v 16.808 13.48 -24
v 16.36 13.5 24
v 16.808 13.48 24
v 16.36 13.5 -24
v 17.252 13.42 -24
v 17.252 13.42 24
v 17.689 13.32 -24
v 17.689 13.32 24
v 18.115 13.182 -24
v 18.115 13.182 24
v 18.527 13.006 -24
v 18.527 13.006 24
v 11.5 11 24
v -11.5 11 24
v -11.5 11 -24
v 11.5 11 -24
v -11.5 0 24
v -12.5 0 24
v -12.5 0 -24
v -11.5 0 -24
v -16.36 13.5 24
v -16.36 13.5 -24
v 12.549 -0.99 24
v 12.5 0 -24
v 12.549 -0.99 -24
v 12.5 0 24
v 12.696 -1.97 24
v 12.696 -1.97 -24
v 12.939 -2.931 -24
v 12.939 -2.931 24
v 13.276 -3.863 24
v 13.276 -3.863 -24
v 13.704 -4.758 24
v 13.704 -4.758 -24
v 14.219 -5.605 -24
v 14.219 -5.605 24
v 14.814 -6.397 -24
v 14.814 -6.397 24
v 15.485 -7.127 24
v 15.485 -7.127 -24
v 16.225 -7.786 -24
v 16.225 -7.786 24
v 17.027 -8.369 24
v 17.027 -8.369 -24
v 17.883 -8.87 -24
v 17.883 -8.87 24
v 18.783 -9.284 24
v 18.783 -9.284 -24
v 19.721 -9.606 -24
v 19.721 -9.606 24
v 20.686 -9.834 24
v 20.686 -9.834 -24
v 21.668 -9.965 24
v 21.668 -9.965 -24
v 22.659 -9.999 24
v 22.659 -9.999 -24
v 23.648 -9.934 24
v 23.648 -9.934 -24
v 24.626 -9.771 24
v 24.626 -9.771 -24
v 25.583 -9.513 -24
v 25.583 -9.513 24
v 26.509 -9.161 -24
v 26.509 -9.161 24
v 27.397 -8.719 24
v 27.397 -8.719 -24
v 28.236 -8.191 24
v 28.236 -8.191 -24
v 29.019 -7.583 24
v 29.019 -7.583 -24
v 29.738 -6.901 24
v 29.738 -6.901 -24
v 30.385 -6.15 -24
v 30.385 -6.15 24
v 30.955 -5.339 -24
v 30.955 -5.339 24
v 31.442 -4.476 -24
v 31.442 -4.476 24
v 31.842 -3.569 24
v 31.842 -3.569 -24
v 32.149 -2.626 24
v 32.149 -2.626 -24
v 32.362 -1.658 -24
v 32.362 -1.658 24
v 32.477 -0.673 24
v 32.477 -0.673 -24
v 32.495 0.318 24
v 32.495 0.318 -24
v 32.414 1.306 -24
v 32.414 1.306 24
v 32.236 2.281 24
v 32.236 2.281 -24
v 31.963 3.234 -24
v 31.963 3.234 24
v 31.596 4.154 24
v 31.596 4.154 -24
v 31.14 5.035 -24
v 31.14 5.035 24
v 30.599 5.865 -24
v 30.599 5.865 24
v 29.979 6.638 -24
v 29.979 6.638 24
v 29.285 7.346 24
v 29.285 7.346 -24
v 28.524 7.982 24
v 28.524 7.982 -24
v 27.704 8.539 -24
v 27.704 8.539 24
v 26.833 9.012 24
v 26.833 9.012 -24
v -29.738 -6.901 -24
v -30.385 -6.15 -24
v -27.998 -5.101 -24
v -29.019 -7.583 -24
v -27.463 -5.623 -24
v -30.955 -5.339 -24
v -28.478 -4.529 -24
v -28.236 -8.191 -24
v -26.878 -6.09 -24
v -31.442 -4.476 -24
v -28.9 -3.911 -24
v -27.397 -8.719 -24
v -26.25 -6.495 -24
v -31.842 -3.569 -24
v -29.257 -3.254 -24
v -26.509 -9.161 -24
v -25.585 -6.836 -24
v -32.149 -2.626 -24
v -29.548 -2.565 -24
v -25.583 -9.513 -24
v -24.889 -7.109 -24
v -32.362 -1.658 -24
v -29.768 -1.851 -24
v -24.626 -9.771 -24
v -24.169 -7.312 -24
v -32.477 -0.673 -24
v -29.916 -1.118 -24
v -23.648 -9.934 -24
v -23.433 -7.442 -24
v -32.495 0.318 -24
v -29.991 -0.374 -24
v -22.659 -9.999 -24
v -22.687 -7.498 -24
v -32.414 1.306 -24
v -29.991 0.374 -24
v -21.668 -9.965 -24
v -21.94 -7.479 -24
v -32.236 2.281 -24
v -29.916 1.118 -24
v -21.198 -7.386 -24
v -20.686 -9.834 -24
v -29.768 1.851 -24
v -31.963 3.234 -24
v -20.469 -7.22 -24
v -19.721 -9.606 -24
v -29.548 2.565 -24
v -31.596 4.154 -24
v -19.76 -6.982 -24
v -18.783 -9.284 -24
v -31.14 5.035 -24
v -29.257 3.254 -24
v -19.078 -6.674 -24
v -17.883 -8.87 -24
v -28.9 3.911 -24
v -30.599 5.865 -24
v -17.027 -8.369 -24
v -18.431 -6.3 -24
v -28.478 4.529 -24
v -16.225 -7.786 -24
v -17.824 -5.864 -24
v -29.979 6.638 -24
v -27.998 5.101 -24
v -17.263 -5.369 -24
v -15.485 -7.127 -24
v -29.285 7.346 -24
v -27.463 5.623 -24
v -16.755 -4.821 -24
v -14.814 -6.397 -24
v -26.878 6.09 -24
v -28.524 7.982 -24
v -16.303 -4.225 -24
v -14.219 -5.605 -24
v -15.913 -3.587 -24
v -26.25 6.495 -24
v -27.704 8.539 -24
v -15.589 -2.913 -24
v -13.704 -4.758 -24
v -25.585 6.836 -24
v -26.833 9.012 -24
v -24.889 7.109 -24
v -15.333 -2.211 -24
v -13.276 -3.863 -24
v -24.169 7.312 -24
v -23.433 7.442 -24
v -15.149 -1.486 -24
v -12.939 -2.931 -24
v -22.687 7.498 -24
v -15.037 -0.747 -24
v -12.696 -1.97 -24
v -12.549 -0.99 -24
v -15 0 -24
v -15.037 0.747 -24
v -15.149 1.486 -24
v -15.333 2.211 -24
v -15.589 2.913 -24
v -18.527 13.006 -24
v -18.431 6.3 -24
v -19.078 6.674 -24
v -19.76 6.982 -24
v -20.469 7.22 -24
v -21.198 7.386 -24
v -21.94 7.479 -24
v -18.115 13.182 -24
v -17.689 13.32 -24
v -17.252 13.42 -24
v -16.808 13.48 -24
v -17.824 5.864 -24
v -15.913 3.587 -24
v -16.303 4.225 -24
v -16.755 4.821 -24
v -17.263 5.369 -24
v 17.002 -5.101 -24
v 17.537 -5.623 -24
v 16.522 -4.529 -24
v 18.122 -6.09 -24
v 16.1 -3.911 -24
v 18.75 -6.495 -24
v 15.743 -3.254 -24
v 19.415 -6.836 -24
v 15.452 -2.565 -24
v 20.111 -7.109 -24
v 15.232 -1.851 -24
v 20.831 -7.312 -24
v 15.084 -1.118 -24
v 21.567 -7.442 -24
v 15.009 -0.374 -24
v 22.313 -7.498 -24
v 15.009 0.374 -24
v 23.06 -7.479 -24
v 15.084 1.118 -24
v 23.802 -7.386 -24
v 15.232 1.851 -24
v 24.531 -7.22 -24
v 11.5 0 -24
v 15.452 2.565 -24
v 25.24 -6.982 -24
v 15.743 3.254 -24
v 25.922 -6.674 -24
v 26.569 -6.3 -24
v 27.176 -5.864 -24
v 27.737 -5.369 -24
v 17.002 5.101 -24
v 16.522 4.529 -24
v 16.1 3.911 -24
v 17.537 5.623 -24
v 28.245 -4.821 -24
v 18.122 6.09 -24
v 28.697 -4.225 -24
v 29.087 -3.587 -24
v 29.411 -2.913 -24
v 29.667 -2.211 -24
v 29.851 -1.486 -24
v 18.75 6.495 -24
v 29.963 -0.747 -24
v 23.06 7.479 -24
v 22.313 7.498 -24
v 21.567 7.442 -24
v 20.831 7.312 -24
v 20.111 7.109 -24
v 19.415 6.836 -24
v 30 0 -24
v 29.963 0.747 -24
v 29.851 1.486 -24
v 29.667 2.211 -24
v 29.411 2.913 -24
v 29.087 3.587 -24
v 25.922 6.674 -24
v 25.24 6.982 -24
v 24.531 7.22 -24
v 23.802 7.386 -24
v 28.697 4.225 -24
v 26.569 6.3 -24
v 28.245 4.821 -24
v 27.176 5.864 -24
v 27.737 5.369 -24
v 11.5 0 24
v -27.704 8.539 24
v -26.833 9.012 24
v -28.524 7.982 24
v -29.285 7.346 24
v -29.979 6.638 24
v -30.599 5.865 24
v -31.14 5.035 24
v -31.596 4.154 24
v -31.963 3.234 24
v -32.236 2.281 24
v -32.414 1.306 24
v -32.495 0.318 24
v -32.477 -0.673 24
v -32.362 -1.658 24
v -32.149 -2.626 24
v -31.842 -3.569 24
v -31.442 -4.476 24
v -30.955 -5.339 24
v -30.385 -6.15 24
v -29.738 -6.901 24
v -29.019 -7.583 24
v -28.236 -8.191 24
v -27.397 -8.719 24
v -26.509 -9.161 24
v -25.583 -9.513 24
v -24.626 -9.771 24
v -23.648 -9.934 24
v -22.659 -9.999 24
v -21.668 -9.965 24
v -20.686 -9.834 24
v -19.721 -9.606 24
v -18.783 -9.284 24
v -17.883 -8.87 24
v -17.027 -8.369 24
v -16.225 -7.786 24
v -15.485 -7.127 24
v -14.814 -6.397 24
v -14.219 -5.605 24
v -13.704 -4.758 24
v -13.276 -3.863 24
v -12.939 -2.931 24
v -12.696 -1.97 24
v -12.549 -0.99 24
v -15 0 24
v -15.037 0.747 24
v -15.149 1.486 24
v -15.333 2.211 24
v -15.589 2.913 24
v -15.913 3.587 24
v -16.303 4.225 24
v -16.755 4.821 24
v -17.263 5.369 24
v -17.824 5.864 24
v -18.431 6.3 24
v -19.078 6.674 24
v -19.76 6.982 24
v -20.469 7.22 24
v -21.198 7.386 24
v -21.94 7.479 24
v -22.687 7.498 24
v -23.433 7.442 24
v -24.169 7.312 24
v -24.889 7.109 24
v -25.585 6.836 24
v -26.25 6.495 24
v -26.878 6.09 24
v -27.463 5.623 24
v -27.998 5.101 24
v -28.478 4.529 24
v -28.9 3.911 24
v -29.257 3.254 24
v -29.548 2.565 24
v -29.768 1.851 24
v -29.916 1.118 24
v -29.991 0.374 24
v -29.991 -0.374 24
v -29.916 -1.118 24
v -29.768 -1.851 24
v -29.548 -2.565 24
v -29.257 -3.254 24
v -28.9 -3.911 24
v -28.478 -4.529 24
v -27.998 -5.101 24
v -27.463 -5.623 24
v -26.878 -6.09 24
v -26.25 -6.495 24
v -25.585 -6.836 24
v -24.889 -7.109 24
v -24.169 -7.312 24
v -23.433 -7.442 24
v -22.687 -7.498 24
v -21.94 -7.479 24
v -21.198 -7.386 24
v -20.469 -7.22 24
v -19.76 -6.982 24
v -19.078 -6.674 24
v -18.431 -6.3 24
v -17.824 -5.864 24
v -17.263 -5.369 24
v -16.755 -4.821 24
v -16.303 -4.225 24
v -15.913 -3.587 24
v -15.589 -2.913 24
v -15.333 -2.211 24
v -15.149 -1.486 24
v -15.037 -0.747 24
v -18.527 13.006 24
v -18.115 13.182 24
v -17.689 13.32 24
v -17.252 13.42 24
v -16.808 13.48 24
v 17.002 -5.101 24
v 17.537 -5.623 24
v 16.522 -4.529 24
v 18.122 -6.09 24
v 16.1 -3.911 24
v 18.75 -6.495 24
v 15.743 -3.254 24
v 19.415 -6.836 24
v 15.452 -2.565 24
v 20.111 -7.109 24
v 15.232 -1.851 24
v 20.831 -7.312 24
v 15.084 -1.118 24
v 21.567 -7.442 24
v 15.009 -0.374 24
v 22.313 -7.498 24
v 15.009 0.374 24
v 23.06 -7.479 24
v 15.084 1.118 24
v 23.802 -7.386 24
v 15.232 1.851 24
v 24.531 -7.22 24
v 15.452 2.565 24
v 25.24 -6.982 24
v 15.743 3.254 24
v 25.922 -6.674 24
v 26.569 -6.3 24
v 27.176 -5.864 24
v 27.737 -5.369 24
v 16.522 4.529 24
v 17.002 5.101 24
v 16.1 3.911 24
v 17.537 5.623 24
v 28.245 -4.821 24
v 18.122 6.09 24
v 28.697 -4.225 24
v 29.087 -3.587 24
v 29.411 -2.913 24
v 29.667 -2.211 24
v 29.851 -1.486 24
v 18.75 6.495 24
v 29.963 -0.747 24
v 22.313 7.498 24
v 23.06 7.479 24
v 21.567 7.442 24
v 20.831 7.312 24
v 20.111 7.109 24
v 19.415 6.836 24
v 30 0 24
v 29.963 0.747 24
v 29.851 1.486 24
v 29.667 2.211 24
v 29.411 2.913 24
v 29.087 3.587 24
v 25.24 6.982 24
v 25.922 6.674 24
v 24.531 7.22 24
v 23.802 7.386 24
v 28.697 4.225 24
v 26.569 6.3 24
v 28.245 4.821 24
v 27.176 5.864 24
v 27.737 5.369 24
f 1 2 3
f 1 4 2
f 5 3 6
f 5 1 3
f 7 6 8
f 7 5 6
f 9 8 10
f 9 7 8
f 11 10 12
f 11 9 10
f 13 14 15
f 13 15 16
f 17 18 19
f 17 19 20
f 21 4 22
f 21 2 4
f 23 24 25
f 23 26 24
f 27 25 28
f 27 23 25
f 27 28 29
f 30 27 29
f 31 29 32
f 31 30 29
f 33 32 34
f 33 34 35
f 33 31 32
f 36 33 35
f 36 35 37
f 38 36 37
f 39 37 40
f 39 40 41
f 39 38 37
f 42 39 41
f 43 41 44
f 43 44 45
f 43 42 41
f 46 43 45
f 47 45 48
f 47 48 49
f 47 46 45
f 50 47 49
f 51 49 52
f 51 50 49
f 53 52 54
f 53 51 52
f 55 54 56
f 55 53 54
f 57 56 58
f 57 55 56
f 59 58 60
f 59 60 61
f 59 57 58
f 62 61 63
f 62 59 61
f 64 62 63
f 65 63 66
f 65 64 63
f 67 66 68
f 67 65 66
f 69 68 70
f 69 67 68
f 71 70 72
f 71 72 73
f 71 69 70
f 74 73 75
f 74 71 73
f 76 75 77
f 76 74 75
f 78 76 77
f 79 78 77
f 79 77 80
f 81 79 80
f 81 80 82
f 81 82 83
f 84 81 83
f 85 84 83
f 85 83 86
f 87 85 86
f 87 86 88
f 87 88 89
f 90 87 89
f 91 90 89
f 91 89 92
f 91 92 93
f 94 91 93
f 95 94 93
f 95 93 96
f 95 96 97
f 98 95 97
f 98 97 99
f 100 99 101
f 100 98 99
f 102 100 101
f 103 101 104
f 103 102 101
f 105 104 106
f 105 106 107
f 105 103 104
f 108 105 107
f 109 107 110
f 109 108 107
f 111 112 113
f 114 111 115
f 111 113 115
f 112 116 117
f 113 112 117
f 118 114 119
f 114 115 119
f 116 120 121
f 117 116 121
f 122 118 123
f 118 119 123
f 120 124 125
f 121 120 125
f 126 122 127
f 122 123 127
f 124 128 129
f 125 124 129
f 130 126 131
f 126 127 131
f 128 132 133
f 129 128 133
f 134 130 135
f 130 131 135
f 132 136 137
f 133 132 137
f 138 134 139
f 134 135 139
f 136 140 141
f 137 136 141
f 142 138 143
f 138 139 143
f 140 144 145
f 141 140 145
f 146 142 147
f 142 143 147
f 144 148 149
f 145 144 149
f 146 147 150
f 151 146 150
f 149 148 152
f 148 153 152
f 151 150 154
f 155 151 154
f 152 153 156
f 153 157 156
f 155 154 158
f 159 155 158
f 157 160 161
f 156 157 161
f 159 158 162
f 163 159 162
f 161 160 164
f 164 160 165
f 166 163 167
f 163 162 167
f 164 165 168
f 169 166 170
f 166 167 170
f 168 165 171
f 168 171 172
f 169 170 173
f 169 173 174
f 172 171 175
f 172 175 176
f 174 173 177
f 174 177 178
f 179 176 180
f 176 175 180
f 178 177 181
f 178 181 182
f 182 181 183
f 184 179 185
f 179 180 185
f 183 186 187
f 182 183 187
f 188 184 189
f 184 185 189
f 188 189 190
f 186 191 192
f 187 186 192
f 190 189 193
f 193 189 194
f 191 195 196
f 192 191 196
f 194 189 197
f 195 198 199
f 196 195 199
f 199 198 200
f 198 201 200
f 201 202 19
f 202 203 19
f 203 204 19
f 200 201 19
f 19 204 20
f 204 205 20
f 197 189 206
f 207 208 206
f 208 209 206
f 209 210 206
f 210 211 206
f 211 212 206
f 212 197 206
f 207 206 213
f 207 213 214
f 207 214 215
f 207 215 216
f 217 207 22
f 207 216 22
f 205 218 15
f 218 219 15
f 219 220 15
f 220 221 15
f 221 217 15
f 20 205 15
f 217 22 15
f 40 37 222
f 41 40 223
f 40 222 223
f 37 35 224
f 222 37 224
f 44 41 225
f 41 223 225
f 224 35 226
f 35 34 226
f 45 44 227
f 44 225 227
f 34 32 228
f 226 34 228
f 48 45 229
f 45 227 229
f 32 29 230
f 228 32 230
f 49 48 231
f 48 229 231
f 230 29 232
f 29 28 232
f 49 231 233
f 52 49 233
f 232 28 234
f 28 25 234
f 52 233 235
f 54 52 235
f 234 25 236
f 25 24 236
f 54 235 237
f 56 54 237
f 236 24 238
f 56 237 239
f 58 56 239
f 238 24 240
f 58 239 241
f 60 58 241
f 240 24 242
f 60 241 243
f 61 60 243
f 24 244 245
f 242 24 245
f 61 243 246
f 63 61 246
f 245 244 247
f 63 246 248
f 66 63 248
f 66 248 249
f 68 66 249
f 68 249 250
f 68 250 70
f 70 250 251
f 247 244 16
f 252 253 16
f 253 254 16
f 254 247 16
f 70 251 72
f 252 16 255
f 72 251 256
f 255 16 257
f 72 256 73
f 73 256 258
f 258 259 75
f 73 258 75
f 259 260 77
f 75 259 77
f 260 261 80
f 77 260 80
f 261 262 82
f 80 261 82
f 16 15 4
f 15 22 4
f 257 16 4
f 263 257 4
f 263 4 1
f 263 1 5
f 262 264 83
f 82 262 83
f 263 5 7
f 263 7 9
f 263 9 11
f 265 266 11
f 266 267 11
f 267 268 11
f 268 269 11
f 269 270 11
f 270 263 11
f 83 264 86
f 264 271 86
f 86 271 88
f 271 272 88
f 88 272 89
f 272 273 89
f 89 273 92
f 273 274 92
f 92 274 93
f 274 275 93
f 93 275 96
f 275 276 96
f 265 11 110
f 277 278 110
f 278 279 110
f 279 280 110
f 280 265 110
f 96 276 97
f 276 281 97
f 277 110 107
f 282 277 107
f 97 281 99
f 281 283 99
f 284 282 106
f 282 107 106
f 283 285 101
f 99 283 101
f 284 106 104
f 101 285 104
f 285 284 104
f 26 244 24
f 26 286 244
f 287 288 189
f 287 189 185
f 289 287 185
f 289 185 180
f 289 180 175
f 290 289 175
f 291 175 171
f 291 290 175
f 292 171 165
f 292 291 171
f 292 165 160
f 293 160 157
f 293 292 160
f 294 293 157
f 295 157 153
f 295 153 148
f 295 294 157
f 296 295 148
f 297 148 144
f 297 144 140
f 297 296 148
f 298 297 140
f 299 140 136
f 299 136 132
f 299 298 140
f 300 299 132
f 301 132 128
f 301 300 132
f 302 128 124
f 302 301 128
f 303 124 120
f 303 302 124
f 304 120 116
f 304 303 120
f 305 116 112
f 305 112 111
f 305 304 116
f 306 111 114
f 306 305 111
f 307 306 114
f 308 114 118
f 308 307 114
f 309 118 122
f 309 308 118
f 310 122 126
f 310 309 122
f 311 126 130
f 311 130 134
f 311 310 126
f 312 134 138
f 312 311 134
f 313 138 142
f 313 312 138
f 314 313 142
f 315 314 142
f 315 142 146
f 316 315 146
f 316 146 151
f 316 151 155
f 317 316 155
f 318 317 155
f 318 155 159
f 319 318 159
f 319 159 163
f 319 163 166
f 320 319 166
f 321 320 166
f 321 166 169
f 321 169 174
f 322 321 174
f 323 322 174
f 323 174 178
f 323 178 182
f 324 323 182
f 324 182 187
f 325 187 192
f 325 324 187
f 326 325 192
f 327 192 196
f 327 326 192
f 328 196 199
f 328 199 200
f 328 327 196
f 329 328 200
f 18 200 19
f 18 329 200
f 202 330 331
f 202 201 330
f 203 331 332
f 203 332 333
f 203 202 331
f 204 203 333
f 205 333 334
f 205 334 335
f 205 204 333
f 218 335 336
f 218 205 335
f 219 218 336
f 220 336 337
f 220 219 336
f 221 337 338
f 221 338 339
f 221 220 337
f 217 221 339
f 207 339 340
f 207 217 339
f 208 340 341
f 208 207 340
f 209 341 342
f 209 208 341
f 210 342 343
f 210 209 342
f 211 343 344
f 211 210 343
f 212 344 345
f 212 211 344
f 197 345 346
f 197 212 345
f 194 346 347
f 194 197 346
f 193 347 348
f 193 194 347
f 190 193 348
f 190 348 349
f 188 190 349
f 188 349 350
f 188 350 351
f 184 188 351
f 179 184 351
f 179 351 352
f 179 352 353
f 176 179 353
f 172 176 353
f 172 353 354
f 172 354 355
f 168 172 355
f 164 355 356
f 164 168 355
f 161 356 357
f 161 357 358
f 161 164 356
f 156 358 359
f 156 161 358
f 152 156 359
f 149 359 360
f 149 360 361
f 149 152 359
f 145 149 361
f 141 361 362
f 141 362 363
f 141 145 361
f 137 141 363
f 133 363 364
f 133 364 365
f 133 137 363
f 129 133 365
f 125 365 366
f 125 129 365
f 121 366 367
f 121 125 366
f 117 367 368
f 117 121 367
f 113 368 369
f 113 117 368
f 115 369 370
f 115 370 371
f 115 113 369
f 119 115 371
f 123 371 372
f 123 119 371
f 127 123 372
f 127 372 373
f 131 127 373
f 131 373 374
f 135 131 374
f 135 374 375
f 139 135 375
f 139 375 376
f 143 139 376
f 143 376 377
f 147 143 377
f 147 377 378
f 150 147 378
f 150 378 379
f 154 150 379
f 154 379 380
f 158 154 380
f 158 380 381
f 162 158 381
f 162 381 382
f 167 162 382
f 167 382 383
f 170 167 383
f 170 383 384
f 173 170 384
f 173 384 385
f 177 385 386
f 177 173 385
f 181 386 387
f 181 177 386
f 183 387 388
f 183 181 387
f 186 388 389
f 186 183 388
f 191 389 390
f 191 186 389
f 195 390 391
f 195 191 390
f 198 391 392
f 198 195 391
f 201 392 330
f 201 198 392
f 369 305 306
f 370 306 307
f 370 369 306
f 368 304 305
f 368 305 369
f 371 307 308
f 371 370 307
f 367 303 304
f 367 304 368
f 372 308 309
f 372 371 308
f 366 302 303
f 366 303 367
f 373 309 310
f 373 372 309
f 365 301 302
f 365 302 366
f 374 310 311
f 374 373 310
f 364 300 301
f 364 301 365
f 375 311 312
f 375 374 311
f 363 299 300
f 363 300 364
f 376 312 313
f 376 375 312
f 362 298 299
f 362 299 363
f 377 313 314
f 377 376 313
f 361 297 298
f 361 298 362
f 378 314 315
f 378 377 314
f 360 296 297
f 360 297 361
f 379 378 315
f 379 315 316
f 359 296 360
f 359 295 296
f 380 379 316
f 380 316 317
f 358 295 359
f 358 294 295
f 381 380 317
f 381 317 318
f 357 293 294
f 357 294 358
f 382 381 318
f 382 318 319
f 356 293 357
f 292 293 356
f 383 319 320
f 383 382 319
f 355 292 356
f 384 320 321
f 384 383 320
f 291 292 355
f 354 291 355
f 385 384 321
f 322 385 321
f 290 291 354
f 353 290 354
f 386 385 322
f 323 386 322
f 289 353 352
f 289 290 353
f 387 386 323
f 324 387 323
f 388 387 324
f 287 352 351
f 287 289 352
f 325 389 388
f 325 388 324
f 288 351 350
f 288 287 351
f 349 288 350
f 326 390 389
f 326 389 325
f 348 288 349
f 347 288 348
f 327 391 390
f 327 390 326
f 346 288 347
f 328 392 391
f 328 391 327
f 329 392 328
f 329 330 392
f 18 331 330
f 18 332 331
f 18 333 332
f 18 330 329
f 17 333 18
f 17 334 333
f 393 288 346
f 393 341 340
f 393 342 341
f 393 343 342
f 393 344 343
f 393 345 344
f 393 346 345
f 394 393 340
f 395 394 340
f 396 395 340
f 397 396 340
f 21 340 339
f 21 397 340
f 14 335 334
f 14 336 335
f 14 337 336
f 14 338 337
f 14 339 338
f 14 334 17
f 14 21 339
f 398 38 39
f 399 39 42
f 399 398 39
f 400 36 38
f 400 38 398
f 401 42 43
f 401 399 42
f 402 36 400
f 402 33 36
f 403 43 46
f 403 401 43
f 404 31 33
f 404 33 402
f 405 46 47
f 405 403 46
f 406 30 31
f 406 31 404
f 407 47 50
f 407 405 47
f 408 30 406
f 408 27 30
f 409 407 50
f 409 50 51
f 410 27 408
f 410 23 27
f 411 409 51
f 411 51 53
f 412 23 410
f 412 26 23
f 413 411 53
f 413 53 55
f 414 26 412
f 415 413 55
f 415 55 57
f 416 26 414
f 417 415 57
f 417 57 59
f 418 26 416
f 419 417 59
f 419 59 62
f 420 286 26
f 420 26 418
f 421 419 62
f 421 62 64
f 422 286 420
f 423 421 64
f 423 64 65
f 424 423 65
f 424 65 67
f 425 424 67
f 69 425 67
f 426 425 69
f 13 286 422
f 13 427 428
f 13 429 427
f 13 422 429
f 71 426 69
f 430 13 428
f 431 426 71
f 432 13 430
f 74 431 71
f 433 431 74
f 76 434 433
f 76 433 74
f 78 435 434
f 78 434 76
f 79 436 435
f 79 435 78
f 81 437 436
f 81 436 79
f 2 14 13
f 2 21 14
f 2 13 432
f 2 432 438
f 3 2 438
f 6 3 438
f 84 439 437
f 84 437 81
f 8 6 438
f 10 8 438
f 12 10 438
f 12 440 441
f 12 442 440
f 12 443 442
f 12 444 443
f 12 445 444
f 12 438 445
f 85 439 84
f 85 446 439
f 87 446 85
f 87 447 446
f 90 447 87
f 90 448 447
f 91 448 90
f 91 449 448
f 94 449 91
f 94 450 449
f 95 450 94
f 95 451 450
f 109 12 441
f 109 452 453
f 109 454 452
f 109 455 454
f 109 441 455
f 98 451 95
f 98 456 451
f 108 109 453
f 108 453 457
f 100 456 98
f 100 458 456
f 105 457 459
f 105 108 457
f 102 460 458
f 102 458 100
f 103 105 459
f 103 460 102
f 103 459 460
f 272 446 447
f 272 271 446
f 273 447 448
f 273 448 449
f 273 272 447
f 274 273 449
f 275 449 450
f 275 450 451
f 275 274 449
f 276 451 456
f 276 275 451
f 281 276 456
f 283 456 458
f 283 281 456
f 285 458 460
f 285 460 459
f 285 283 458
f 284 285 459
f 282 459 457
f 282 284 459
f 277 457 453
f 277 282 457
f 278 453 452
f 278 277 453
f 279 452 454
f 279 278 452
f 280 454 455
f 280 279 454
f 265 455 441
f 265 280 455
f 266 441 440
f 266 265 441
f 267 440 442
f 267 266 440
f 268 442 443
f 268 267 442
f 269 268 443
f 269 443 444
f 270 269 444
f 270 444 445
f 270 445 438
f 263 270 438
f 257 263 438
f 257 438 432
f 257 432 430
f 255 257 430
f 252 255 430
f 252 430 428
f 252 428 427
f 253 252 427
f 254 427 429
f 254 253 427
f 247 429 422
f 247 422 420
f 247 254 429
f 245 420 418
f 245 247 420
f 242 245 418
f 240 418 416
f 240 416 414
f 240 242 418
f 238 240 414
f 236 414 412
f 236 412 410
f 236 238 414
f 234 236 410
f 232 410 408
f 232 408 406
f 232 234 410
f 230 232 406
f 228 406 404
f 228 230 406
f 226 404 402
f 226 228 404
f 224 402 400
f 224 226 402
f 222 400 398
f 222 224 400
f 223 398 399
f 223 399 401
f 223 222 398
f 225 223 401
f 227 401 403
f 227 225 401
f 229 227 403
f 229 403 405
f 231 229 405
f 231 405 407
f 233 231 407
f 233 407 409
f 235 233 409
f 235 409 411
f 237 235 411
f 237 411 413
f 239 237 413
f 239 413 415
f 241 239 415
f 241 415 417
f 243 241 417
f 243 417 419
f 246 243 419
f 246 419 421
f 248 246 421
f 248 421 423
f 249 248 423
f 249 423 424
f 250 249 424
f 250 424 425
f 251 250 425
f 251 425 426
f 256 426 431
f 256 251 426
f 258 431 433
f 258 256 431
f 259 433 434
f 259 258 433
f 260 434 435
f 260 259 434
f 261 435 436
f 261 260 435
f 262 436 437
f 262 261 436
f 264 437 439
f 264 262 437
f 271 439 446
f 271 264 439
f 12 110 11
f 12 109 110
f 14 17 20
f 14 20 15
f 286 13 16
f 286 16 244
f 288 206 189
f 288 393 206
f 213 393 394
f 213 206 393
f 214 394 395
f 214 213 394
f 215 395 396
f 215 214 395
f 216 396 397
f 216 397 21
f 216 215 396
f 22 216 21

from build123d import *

# Parameters (mm, degrees)
F0_R     = 7.5
F1_DEPTH = 24
F2_R     = 5


with BuildPart() as f1:
    # F0 (on Top) → F1 (new body, symmetric)
    with BuildSketch(Plane.XY):
        with BuildLine():
            Line((-17.5, 13.5), (-26.833323, 9.012342))
            ThreePointArc((-26.833323, 9.012342), (-27.822911, -8.465614), (-12.5, 0))
            Line((-12.5, 0), (-11.5, 0))
            Line((-11.5, 0), (-11.5, 11))
            Line((-11.5, 11), (11.5, 11))
            Line((11.5, 11), (11.5, 0))
            Line((11.5, 0), (12.5, 0))
            ThreePointArc((12.5, 0), (27.822911, -8.465614), (26.833323, 9.012342))
            Line((26.833323, 9.012342), (17.5, 13.5))
            Line((17.5, 13.5), (-17.5, 13.5))
        make_face()
        with Locations((-22.5, 0)):
            Circle(F0_R, mode=Mode.SUBTRACT)
        with Locations((22.5, 0)):
            Circle(F0_R, mode=Mode.SUBTRACT)
    extrude(amount=F1_DEPTH, both=True)

    # F2
    f2_edges = [f1.edges().sort_by_distance(p)[0] for p in [
        (17.5, 13.5, 0),
        (-17.5, 13.5, 0),
    ]]
    fillet(f2_edges, radius=F2_R)


solid = f1.part
